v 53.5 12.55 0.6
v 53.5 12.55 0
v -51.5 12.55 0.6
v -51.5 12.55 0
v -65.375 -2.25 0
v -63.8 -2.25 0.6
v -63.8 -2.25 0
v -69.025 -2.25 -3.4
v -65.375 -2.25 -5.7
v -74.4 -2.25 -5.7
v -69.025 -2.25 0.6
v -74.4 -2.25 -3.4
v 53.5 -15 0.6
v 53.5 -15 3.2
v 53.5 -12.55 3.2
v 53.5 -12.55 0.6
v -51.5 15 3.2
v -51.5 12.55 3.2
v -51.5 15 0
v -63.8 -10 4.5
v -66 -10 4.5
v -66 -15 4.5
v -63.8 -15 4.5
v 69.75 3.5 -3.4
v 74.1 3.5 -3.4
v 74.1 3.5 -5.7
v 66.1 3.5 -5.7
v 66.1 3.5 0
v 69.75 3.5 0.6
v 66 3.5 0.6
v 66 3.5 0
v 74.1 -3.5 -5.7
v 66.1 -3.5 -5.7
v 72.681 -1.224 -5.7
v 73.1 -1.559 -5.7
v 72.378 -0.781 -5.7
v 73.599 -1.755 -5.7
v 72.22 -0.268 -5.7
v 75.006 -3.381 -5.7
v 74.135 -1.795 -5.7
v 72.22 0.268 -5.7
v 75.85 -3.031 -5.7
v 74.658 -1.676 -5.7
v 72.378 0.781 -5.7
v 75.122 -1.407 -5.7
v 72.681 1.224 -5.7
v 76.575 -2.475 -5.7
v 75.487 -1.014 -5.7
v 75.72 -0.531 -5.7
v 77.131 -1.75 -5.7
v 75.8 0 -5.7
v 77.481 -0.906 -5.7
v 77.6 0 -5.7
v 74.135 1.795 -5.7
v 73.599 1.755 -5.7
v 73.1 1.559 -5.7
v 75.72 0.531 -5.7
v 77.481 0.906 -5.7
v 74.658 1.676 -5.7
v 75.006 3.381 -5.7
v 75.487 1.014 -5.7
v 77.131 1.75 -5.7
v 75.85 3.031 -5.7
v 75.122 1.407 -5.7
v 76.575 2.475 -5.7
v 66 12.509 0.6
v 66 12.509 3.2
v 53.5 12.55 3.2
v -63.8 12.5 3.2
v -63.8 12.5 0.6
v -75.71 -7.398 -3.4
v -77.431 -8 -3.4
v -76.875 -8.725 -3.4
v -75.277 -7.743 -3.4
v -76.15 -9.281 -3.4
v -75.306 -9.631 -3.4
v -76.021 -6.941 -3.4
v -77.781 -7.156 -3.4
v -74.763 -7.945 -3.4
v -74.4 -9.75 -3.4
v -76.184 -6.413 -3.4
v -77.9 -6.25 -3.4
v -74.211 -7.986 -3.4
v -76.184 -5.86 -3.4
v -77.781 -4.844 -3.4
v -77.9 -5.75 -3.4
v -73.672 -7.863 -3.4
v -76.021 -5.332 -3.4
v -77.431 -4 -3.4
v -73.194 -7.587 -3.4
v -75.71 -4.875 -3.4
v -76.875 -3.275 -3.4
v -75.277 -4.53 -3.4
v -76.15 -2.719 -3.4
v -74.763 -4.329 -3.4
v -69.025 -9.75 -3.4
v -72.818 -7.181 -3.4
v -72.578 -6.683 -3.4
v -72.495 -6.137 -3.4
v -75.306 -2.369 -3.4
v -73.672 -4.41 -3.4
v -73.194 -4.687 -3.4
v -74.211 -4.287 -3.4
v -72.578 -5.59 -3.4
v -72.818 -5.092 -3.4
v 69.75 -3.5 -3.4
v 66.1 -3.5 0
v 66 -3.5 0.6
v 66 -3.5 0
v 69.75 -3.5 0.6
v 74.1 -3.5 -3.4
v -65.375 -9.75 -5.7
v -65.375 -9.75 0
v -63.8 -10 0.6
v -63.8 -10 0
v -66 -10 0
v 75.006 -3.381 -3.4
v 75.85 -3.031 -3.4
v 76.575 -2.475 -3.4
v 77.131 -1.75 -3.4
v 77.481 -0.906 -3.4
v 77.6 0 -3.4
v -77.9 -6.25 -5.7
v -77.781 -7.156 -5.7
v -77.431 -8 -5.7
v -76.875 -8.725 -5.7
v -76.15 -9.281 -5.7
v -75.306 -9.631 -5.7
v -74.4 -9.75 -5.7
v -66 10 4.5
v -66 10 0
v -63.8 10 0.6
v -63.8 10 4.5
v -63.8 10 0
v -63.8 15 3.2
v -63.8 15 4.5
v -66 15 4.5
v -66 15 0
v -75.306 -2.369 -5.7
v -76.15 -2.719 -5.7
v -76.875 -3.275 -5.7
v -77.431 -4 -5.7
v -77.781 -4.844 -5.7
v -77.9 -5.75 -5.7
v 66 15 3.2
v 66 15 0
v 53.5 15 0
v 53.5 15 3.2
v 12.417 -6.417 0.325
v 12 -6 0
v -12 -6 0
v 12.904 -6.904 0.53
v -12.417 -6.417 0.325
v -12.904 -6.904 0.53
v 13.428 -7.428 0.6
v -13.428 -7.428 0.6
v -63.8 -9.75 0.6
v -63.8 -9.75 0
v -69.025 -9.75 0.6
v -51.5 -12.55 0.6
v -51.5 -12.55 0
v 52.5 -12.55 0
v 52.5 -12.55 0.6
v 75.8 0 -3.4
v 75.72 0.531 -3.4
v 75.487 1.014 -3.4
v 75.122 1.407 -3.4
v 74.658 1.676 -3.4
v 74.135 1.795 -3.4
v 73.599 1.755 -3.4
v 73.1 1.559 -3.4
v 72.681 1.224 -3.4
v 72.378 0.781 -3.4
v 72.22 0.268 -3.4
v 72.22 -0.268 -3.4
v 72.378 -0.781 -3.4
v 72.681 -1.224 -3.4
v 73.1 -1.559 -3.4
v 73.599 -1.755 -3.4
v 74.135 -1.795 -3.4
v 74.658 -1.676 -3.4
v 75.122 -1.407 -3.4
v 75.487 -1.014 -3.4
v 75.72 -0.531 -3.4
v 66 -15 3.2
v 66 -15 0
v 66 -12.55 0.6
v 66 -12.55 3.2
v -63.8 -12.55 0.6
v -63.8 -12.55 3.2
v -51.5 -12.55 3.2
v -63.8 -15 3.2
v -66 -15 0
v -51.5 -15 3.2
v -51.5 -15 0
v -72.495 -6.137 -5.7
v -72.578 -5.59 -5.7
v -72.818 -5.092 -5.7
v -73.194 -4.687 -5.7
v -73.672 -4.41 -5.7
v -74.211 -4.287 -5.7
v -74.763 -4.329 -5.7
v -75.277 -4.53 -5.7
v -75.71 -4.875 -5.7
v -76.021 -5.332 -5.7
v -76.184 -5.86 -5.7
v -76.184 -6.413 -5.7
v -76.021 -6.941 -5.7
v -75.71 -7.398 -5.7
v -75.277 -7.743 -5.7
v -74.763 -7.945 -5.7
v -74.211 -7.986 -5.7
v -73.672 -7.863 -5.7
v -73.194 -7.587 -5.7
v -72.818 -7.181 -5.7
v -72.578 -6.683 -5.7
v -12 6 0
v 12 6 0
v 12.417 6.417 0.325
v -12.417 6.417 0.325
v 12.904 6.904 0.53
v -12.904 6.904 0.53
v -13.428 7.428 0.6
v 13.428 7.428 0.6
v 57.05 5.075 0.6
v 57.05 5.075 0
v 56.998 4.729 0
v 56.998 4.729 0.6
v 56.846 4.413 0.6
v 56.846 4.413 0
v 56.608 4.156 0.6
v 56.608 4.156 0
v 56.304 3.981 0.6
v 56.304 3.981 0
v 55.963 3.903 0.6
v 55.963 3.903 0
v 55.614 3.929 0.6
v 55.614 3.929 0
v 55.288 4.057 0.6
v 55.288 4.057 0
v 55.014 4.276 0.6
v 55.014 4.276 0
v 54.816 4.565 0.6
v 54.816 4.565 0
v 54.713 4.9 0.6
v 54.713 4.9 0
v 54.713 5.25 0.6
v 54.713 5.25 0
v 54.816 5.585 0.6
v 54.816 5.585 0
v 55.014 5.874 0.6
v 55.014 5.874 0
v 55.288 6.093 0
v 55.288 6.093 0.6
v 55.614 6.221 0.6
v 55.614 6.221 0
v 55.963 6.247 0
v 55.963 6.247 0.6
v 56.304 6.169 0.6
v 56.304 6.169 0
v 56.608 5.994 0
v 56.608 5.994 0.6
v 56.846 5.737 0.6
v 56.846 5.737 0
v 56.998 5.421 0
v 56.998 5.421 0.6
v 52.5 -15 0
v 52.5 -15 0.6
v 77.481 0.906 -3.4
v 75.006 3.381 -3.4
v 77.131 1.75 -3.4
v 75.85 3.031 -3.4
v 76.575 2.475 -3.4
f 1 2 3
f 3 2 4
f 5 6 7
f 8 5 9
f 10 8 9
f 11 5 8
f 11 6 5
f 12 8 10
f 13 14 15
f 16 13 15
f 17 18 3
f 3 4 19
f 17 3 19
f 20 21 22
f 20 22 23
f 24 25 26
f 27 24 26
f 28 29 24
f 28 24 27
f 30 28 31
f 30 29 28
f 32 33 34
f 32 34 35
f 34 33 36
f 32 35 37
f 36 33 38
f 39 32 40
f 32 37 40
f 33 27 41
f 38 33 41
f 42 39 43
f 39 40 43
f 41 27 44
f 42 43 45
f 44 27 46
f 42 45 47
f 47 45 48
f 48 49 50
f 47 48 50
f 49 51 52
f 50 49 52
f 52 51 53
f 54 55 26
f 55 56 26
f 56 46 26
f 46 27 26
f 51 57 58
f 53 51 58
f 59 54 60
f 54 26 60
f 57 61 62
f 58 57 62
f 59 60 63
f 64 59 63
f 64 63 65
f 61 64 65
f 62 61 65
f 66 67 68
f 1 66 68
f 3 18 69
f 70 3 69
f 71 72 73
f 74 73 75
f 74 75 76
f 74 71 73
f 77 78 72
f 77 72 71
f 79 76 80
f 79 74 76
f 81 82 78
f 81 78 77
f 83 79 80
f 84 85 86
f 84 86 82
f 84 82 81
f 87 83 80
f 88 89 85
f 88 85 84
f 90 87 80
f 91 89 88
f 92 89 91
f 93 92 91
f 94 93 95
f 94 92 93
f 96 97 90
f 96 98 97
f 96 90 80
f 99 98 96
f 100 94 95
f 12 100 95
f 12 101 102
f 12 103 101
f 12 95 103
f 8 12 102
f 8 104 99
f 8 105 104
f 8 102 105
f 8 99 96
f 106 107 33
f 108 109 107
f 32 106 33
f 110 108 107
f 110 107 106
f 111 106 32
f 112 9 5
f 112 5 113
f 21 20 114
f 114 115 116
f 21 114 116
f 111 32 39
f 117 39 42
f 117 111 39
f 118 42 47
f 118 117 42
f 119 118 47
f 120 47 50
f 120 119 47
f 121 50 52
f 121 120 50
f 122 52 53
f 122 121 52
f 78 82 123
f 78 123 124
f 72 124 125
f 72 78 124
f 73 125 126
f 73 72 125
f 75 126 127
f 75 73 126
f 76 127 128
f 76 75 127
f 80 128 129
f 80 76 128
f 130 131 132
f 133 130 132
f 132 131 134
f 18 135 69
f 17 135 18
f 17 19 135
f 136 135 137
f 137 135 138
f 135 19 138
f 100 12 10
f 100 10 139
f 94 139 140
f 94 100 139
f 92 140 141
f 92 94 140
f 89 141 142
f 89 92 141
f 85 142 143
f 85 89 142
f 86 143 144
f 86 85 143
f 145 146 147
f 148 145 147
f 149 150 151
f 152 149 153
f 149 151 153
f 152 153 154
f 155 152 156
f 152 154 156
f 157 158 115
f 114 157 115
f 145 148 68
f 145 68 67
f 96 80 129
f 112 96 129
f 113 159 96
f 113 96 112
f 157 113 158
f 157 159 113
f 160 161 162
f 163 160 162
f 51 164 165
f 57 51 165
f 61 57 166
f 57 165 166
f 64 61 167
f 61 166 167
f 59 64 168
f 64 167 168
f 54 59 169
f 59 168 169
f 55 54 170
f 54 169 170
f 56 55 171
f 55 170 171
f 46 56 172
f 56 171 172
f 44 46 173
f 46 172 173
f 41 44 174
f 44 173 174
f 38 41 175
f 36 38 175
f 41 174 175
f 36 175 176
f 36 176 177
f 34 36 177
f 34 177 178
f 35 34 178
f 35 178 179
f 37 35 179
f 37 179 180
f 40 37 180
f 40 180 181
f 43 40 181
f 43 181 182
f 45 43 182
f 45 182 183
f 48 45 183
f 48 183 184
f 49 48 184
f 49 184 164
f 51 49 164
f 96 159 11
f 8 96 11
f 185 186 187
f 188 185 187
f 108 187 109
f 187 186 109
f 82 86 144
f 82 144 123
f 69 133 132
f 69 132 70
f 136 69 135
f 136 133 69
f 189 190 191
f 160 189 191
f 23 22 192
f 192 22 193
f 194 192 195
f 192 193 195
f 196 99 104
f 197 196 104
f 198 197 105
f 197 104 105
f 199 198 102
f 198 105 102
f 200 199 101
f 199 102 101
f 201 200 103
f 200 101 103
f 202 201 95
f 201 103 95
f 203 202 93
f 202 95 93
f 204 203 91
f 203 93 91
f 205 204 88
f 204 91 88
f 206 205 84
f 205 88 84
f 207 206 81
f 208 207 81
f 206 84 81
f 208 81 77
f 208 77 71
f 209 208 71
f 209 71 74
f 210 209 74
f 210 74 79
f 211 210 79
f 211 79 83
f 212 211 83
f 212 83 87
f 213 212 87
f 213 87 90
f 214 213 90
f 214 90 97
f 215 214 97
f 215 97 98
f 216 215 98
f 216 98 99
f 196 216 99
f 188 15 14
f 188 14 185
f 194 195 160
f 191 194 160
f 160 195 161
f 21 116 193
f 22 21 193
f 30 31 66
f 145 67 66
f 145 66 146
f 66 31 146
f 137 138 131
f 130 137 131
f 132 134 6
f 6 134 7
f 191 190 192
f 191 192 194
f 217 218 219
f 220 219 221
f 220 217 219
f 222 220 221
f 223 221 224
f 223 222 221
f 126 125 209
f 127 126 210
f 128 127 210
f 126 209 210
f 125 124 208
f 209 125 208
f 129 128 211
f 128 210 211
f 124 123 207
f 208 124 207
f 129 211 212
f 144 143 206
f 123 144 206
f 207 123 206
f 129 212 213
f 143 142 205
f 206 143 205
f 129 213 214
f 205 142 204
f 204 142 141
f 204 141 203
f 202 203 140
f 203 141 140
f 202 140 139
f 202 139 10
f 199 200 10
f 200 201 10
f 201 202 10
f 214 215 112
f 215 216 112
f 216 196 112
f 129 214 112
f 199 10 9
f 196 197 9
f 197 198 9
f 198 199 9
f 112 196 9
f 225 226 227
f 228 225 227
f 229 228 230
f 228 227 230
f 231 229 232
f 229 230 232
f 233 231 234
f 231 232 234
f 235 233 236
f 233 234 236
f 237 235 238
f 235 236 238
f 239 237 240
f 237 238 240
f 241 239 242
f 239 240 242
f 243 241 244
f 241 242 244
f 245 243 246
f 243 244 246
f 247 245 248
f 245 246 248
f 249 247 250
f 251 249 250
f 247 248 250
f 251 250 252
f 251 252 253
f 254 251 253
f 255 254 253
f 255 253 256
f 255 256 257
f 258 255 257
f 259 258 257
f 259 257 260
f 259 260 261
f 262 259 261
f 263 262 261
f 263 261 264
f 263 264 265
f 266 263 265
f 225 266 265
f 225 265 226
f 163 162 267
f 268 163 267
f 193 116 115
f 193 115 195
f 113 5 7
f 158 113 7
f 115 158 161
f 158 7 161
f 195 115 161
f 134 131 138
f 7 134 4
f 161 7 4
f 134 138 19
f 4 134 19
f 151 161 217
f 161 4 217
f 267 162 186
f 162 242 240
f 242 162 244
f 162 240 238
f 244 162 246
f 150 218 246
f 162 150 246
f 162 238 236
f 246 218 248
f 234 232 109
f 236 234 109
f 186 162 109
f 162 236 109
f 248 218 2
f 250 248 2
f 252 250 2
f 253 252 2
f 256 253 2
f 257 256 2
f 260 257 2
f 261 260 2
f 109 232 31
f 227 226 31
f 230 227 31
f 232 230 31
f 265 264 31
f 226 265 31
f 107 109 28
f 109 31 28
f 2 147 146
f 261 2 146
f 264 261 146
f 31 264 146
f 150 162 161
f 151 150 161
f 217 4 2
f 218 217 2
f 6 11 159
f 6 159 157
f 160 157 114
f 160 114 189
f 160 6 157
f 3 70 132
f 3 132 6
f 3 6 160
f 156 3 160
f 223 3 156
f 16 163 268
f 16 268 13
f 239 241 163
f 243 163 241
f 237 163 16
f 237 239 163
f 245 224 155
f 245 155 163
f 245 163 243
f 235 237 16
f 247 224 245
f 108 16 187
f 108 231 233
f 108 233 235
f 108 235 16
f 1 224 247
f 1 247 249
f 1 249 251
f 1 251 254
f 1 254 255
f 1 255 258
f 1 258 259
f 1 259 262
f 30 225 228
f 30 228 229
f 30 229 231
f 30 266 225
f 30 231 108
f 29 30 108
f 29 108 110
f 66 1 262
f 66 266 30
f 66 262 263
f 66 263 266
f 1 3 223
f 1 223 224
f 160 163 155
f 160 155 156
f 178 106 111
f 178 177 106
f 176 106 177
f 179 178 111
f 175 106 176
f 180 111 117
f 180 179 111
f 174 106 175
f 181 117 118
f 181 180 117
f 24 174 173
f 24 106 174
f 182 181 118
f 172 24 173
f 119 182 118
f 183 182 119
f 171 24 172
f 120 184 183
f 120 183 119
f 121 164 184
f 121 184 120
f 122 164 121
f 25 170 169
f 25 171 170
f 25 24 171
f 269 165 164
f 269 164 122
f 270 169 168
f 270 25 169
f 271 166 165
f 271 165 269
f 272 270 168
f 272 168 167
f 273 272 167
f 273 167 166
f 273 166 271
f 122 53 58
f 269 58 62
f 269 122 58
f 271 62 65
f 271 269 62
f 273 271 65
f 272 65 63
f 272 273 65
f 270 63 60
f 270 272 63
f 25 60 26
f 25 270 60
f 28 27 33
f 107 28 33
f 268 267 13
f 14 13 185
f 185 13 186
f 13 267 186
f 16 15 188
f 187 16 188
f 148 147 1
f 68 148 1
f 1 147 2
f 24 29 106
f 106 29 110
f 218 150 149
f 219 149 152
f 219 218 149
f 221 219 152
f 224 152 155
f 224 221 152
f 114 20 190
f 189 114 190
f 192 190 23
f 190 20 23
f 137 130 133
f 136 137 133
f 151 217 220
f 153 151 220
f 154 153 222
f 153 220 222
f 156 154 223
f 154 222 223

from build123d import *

# Parameters (mm, degrees)
F0_W          = 24
F0_H          = 12
F1_DEPTH      = 4.5
F2_W          = 134.0499658869
F2_H          = 37.3212727123
F3_DEPTH      = 1.3
F5_DEPTH      = 2.6
F6_R          = 1.8
F6_R_2        = 1.8546222436
F7_DEPTH      = 6.3
F8_W          = 131.4748737342
F8_H          = 57.6514146297
F9_DEPTH      = 5.7
F10_R         = 1.175
F11_DEPTH     = 2
F12_R         = 1.8546222436
F12_R_2       = 1.8
F13_DEPTH     = 4
F14_T1_DEPTH  = 24
F14_T3_DEPTH  = 12
F14_T9_DEPTH  = 15.5707142143
F14_T13_DEPTH = 27.5707142143
F14_T20_DEPTH = 27.5707142143
F14_T24_DEPTH = 15.5707142143
F14_T31_DEPTH = 15.5707142143
F14_T35_DEPTH = 27.5707142143
F14_T42_DEPTH = 27.5707142143
F14_T46_DEPTH = 15.5707142143


# Not quite as in the source:
# - a fillet or chamfer that OpenCascade refuses, or shapes differently, is made with other operations: its cross-section is extruded or revolved along the edge and cut away or added


with BuildPart() as f1:
    # F0 (on Top) → F1 (new body)
    with BuildSketch(Plane.XY):
        Polygon((-51.5, 15), (-66, 15), (-66, 10), (-63.8, 10), (-63.8, -10), (-66, -10), (-66, -15), (-51.5, -15), (-51.5, -12.55), (52.5, -12.55), (52.5, -15), (66, -15), (66, 15), (53.5, 15), (53.5, 12.55), (-51.5, 12.55), align=None)
        Rectangle(F0_W, F0_H, mode=Mode.SUBTRACT)
    extrude(amount=F1_DEPTH)

    # F2 (on face) → F3 (cut)
    with BuildSketch(Plane.XY.offset(4.5)):
        with Locations((3.2249829435, -1.1242744513)):
            Rectangle(F2_W, F2_H)
    extrude(amount=-F3_DEPTH, mode=Mode.SUBTRACT)

    # F4 (on face) → F5 (cut)
    with BuildSketch(Plane.XY.offset(3.2)):
        Polygon((-63.8, 12.5), (-63.8, -12.55), (-51.5, -12.55), (-51.5, -30.0471726805), (53.5, -30.0471726805), (53.5, -12.55), (68.7586962298, -12.55), (68.7586962298, 12.5), (53.5, 12.55), (53.5, 21.0785120726), (-51.5, 21.0785120726), (-51.5, 12.55), align=None)
    extrude(amount=-F5_DEPTH, mode=Mode.SUBTRACT)

    # F6 (on face) → F7 (join)
    with BuildSketch(Plane.XY.offset(0.6)):
        with BuildLine():
            Line((66, 3.5), (66, -3.5))
            Line((66, -3.5), (74.1, -3.5))
            ThreePointArc((74.1, -3.5), (76.5748737342, -2.4748737342), (77.6, 0))
            ThreePointArc((77.6, 0), (76.5748737342, 2.4748737342), (74.1, 3.5))
            Line((74.1, 3.5), (66, 3.5))
        make_face()
        with Locations((74, 0)):
            Circle(F6_R, mode=Mode.SUBTRACT)
        with BuildLine():
            Line((-74.4, -9.75), (-63.8, -9.75))
            Line((-63.8, -9.75), (-63.8, -2.25))
            Line((-63.8, -2.25), (-74.4, -2.25))
            ThreePointArc((-74.4, -2.25), (-76.8748737342, -3.2751262658), (-77.9, -5.75))
            Line((-77.9, -5.75), (-77.9, -6.25))
            ThreePointArc((-77.9, -6.25), (-76.8748737342, -8.7248737342), (-74.4, -9.75))
        make_face()
        with Locations((-74.35, -6.136629995)):
            Circle(F6_R_2, mode=Mode.SUBTRACT)
    extrude(amount=-F7_DEPTH)

    # F8 (on face) → F9 (cut, through all)
    with BuildSketch(Plane(origin=(0, 0, -5.7), x_dir=(1, 0, 0), z_dir=(0, 0, -1))):
        with Locations((0.3625631329, -2.5597326458)):
            Rectangle(F8_W, F8_H)
    extrude(amount=-F9_DEPTH, mode=Mode.SUBTRACT)

    # F10 (on face) → F11 (cut)
    with BuildSketch(Plane(origin=(0, 0, 0), x_dir=(1, 0, 0), z_dir=(0, 0, -1))):
        with Locations((55.875, -5.075)):
            Circle(F10_R)
    extrude(amount=-F11_DEPTH, mode=Mode.SUBTRACT)

    # F12 (on face) → F13 (cut)
    with BuildSketch(Plane.XY.offset(0.6)):
        with BuildLine():
            Line((-69.0248737342, -9.75), (-69.0248737342, -2.25))
            Line((-69.0248737342, -2.25), (-74.4, -2.25))
            ThreePointArc((-74.4, -2.25), (-76.8748737342, -3.2751262658), (-77.9, -5.75))
            Line((-77.9, -5.75), (-77.9, -6.25))
            ThreePointArc((-77.9, -6.25), (-76.8748737342, -8.7248737342), (-74.4, -9.75))
            Line((-74.4, -9.75), (-69.0248737342, -9.75))
        make_face()
        with Locations((-74.35, -6.136629995)):
            Circle(F12_R, mode=Mode.SUBTRACT)
        with BuildLine():
            Line((74.1, 3.5), (69.75, 3.5))
            Line((69.75, 3.5), (69.75, -3.5))
            Line((69.75, -3.5), (74.1, -3.5))
            ThreePointArc((74.1, -3.5), (77.6, 0), (74.1, 3.5))
        make_face()
        with Locations((74, 0)):
            Circle(F12_R_2, mode=Mode.SUBTRACT)
    extrude(amount=-F13_DEPTH, mode=Mode.SUBTRACT)

    # F14: fillet of radius 2 on 4 edges, made by hand

    # F14_s2 → F14_t1 (cut)
    with BuildSketch(Plane.YZ.offset(-12)):
        with BuildLine():
            ThreePointArc((6, 0), (6.6536890165, 0.4439088915), (7.4282856857, 0.6))
            Line((7.4282856857, 0.6), (6, 0.6))
            Line((6, 0.6), (6, 0))
        make_face()
        with BuildLine():
            ThreePointArc((-6, 0), (-6.6536890165, 0.4439088915), (-7.4282856857, 0.6))
            Line((-7.4282856857, 0.6), (-6, 0.6))
            Line((-6, 0.6), (-6, 0))
        make_face()
    extrude(amount=F14_T1_DEPTH, mode=Mode.SUBTRACT)

    # F14_s4 → F14_t3 (cut)
    with BuildSketch(Plane.XZ.offset(-6)):
        with BuildLine():
            ThreePointArc((-12, 0), (-12.6536890165, 0.4439088915), (-13.4282856857, 0.6))
            Line((-13.4282856857, 0.6), (-12, 0.6))
            Line((-12, 0.6), (-12, 0))
        make_face()
        with BuildLine():
            ThreePointArc((12, 0), (12.6536890165, 0.4439088915), (13.4282856857, 0.6))
            Line((13.4282856857, 0.6), (12, 0.6))
            Line((12, 0.6), (12, 0))
        make_face()
    extrude(amount=F14_T3_DEPTH, mode=Mode.SUBTRACT)


with BuildPart() as f14_tool7:
    # F14_s8 → F14_t9 (new body)
    with BuildSketch(Plane.XZ.offset(6)):
        with BuildLine():
            ThreePointArc((-12, 0), (-12.6536890165, 0.4439088915), (-13.4282856857, 0.6))
            Line((-13.4282856857, 0.6), (-12, 0.6))
            Line((-12, 0.6), (-12, 0))
        make_face()
    extrude(amount=-F14_T9_DEPTH)

    split(bisect_by=Plane.XZ.offset(-6), keep=Keep.BOTTOM)


with BuildPart() as f14_tool11:
    # F14_s12 → F14_t13 (new body)
    with BuildSketch(Plane.YZ.offset(-15.5707142143)):
        with BuildLine():
            ThreePointArc((6, 0), (6.6536890165, 0.4439088915), (7.4282856857, 0.6))
            Line((7.4282856857, 0.6), (6, 0.6))
            Line((6, 0.6), (6, 0))
        make_face()
    extrude(amount=F14_T13_DEPTH)

    split(bisect_by=Plane.YZ.offset(-12), keep=Keep.BOTTOM)


with BuildPart() as f14_tool7_1:
    add(f14_tool7.part)

    # F14_t15: intersect F14_tool11
    add(f14_tool11.part, mode=Mode.INTERSECT)


with BuildPart() as f1_1:
    add(f1.part)

    # F14_t5: cut F14_tool7
    add(f14_tool7_1.part, mode=Mode.SUBTRACT)


with BuildPart() as f14_tool18:
    # F14_s19 → F14_t20 (new body)
    with BuildSketch(Plane.YZ.offset(-12)):
        with BuildLine():
            ThreePointArc((6, 0), (6.6536890165, 0.4439088915), (7.4282856857, 0.6))
            Line((7.4282856857, 0.6), (6, 0.6))
            Line((6, 0.6), (6, 0))
        make_face()
    extrude(amount=F14_T20_DEPTH)

    split(bisect_by=Plane.YZ.offset(12), keep=Keep.TOP)


with BuildPart() as f14_tool22:
    # F14_s23 → F14_t24 (new body)
    with BuildSketch(Plane.XZ.offset(-9.5707142143)):
        with BuildLine():
            ThreePointArc((12, 0), (12.6536890165, 0.4439088915), (13.4282856857, 0.6))
            Line((13.4282856857, 0.6), (12, 0.6))
            Line((12, 0.6), (12, 0))
        make_face()
    extrude(amount=F14_T24_DEPTH)

    split(bisect_by=Plane.XZ.offset(-6), keep=Keep.BOTTOM)


with BuildPart() as f14_tool18_1:
    add(f14_tool18.part)

    # F14_t26: intersect F14_tool22
    add(f14_tool22.part, mode=Mode.INTERSECT)


with BuildPart() as f1_2:
    add(f1_1.part)

    # F14_t16: cut F14_tool18
    add(f14_tool18_1.part, mode=Mode.SUBTRACT)


with BuildPart() as f14_tool29:
    # F14_s30 → F14_t31 (new body)
    with BuildSketch(Plane.XZ.offset(9.5707142143)):
        with BuildLine():
            ThreePointArc((-12, 0), (-12.6536890165, 0.4439088915), (-13.4282856857, 0.6))
            Line((-13.4282856857, 0.6), (-12, 0.6))
            Line((-12, 0.6), (-12, 0))
        make_face()
    extrude(amount=-F14_T31_DEPTH)

    split(bisect_by=Plane.XZ.offset(6), keep=Keep.TOP)


with BuildPart() as f14_tool33:
    # F14_s34 → F14_t35 (new body)
    with BuildSketch(Plane.YZ.offset(12)):
        with BuildLine():
            ThreePointArc((-6, 0), (-6.6536890165, 0.4439088915), (-7.4282856857, 0.6))
            Line((-7.4282856857, 0.6), (-6, 0.6))
            Line((-6, 0.6), (-6, 0))
        make_face()
    extrude(amount=-F14_T35_DEPTH)

    split(bisect_by=Plane.YZ.offset(-12), keep=Keep.BOTTOM)


with BuildPart() as f14_tool29_1:
    add(f14_tool29.part)

    # F14_t37: intersect F14_tool33
    add(f14_tool33.part, mode=Mode.INTERSECT)


with BuildPart() as f1_3:
    add(f1_2.part)

    # F14_t27: cut F14_tool29
    add(f14_tool29_1.part, mode=Mode.SUBTRACT)


with BuildPart() as f14_tool40:
    # F14_s41 → F14_t42 (new body)
    with BuildSketch(Plane.YZ.offset(15.5707142143)):
        with BuildLine():
            ThreePointArc((-6, 0), (-6.6536890165, 0.4439088915), (-7.4282856857, 0.6))
            Line((-7.4282856857, 0.6), (-6, 0.6))
            Line((-6, 0.6), (-6, 0))
        make_face()
    extrude(amount=-F14_T42_DEPTH)

    split(bisect_by=Plane.YZ.offset(12), keep=Keep.TOP)


with BuildPart() as f14_tool44:
    # F14_s45 → F14_t46 (new body)
    with BuildSketch(Plane.XZ.offset(-6)):
        with BuildLine():
            ThreePointArc((12, 0), (12.6536890165, 0.4439088915), (13.4282856857, 0.6))
            Line((13.4282856857, 0.6), (12, 0.6))
            Line((12, 0.6), (12, 0))
        make_face()
    extrude(amount=F14_T46_DEPTH)

    split(bisect_by=Plane.XZ.offset(6), keep=Keep.TOP)


with BuildPart() as f14_tool40_1:
    add(f14_tool40.part)

    # F14_t48: intersect F14_tool44
    add(f14_tool44.part, mode=Mode.INTERSECT)


with BuildPart() as f1_4:
    add(f1_3.part)

    # F14_t38: cut F14_tool40
    add(f14_tool40_1.part, mode=Mode.SUBTRACT)


solid = f1_4.part
